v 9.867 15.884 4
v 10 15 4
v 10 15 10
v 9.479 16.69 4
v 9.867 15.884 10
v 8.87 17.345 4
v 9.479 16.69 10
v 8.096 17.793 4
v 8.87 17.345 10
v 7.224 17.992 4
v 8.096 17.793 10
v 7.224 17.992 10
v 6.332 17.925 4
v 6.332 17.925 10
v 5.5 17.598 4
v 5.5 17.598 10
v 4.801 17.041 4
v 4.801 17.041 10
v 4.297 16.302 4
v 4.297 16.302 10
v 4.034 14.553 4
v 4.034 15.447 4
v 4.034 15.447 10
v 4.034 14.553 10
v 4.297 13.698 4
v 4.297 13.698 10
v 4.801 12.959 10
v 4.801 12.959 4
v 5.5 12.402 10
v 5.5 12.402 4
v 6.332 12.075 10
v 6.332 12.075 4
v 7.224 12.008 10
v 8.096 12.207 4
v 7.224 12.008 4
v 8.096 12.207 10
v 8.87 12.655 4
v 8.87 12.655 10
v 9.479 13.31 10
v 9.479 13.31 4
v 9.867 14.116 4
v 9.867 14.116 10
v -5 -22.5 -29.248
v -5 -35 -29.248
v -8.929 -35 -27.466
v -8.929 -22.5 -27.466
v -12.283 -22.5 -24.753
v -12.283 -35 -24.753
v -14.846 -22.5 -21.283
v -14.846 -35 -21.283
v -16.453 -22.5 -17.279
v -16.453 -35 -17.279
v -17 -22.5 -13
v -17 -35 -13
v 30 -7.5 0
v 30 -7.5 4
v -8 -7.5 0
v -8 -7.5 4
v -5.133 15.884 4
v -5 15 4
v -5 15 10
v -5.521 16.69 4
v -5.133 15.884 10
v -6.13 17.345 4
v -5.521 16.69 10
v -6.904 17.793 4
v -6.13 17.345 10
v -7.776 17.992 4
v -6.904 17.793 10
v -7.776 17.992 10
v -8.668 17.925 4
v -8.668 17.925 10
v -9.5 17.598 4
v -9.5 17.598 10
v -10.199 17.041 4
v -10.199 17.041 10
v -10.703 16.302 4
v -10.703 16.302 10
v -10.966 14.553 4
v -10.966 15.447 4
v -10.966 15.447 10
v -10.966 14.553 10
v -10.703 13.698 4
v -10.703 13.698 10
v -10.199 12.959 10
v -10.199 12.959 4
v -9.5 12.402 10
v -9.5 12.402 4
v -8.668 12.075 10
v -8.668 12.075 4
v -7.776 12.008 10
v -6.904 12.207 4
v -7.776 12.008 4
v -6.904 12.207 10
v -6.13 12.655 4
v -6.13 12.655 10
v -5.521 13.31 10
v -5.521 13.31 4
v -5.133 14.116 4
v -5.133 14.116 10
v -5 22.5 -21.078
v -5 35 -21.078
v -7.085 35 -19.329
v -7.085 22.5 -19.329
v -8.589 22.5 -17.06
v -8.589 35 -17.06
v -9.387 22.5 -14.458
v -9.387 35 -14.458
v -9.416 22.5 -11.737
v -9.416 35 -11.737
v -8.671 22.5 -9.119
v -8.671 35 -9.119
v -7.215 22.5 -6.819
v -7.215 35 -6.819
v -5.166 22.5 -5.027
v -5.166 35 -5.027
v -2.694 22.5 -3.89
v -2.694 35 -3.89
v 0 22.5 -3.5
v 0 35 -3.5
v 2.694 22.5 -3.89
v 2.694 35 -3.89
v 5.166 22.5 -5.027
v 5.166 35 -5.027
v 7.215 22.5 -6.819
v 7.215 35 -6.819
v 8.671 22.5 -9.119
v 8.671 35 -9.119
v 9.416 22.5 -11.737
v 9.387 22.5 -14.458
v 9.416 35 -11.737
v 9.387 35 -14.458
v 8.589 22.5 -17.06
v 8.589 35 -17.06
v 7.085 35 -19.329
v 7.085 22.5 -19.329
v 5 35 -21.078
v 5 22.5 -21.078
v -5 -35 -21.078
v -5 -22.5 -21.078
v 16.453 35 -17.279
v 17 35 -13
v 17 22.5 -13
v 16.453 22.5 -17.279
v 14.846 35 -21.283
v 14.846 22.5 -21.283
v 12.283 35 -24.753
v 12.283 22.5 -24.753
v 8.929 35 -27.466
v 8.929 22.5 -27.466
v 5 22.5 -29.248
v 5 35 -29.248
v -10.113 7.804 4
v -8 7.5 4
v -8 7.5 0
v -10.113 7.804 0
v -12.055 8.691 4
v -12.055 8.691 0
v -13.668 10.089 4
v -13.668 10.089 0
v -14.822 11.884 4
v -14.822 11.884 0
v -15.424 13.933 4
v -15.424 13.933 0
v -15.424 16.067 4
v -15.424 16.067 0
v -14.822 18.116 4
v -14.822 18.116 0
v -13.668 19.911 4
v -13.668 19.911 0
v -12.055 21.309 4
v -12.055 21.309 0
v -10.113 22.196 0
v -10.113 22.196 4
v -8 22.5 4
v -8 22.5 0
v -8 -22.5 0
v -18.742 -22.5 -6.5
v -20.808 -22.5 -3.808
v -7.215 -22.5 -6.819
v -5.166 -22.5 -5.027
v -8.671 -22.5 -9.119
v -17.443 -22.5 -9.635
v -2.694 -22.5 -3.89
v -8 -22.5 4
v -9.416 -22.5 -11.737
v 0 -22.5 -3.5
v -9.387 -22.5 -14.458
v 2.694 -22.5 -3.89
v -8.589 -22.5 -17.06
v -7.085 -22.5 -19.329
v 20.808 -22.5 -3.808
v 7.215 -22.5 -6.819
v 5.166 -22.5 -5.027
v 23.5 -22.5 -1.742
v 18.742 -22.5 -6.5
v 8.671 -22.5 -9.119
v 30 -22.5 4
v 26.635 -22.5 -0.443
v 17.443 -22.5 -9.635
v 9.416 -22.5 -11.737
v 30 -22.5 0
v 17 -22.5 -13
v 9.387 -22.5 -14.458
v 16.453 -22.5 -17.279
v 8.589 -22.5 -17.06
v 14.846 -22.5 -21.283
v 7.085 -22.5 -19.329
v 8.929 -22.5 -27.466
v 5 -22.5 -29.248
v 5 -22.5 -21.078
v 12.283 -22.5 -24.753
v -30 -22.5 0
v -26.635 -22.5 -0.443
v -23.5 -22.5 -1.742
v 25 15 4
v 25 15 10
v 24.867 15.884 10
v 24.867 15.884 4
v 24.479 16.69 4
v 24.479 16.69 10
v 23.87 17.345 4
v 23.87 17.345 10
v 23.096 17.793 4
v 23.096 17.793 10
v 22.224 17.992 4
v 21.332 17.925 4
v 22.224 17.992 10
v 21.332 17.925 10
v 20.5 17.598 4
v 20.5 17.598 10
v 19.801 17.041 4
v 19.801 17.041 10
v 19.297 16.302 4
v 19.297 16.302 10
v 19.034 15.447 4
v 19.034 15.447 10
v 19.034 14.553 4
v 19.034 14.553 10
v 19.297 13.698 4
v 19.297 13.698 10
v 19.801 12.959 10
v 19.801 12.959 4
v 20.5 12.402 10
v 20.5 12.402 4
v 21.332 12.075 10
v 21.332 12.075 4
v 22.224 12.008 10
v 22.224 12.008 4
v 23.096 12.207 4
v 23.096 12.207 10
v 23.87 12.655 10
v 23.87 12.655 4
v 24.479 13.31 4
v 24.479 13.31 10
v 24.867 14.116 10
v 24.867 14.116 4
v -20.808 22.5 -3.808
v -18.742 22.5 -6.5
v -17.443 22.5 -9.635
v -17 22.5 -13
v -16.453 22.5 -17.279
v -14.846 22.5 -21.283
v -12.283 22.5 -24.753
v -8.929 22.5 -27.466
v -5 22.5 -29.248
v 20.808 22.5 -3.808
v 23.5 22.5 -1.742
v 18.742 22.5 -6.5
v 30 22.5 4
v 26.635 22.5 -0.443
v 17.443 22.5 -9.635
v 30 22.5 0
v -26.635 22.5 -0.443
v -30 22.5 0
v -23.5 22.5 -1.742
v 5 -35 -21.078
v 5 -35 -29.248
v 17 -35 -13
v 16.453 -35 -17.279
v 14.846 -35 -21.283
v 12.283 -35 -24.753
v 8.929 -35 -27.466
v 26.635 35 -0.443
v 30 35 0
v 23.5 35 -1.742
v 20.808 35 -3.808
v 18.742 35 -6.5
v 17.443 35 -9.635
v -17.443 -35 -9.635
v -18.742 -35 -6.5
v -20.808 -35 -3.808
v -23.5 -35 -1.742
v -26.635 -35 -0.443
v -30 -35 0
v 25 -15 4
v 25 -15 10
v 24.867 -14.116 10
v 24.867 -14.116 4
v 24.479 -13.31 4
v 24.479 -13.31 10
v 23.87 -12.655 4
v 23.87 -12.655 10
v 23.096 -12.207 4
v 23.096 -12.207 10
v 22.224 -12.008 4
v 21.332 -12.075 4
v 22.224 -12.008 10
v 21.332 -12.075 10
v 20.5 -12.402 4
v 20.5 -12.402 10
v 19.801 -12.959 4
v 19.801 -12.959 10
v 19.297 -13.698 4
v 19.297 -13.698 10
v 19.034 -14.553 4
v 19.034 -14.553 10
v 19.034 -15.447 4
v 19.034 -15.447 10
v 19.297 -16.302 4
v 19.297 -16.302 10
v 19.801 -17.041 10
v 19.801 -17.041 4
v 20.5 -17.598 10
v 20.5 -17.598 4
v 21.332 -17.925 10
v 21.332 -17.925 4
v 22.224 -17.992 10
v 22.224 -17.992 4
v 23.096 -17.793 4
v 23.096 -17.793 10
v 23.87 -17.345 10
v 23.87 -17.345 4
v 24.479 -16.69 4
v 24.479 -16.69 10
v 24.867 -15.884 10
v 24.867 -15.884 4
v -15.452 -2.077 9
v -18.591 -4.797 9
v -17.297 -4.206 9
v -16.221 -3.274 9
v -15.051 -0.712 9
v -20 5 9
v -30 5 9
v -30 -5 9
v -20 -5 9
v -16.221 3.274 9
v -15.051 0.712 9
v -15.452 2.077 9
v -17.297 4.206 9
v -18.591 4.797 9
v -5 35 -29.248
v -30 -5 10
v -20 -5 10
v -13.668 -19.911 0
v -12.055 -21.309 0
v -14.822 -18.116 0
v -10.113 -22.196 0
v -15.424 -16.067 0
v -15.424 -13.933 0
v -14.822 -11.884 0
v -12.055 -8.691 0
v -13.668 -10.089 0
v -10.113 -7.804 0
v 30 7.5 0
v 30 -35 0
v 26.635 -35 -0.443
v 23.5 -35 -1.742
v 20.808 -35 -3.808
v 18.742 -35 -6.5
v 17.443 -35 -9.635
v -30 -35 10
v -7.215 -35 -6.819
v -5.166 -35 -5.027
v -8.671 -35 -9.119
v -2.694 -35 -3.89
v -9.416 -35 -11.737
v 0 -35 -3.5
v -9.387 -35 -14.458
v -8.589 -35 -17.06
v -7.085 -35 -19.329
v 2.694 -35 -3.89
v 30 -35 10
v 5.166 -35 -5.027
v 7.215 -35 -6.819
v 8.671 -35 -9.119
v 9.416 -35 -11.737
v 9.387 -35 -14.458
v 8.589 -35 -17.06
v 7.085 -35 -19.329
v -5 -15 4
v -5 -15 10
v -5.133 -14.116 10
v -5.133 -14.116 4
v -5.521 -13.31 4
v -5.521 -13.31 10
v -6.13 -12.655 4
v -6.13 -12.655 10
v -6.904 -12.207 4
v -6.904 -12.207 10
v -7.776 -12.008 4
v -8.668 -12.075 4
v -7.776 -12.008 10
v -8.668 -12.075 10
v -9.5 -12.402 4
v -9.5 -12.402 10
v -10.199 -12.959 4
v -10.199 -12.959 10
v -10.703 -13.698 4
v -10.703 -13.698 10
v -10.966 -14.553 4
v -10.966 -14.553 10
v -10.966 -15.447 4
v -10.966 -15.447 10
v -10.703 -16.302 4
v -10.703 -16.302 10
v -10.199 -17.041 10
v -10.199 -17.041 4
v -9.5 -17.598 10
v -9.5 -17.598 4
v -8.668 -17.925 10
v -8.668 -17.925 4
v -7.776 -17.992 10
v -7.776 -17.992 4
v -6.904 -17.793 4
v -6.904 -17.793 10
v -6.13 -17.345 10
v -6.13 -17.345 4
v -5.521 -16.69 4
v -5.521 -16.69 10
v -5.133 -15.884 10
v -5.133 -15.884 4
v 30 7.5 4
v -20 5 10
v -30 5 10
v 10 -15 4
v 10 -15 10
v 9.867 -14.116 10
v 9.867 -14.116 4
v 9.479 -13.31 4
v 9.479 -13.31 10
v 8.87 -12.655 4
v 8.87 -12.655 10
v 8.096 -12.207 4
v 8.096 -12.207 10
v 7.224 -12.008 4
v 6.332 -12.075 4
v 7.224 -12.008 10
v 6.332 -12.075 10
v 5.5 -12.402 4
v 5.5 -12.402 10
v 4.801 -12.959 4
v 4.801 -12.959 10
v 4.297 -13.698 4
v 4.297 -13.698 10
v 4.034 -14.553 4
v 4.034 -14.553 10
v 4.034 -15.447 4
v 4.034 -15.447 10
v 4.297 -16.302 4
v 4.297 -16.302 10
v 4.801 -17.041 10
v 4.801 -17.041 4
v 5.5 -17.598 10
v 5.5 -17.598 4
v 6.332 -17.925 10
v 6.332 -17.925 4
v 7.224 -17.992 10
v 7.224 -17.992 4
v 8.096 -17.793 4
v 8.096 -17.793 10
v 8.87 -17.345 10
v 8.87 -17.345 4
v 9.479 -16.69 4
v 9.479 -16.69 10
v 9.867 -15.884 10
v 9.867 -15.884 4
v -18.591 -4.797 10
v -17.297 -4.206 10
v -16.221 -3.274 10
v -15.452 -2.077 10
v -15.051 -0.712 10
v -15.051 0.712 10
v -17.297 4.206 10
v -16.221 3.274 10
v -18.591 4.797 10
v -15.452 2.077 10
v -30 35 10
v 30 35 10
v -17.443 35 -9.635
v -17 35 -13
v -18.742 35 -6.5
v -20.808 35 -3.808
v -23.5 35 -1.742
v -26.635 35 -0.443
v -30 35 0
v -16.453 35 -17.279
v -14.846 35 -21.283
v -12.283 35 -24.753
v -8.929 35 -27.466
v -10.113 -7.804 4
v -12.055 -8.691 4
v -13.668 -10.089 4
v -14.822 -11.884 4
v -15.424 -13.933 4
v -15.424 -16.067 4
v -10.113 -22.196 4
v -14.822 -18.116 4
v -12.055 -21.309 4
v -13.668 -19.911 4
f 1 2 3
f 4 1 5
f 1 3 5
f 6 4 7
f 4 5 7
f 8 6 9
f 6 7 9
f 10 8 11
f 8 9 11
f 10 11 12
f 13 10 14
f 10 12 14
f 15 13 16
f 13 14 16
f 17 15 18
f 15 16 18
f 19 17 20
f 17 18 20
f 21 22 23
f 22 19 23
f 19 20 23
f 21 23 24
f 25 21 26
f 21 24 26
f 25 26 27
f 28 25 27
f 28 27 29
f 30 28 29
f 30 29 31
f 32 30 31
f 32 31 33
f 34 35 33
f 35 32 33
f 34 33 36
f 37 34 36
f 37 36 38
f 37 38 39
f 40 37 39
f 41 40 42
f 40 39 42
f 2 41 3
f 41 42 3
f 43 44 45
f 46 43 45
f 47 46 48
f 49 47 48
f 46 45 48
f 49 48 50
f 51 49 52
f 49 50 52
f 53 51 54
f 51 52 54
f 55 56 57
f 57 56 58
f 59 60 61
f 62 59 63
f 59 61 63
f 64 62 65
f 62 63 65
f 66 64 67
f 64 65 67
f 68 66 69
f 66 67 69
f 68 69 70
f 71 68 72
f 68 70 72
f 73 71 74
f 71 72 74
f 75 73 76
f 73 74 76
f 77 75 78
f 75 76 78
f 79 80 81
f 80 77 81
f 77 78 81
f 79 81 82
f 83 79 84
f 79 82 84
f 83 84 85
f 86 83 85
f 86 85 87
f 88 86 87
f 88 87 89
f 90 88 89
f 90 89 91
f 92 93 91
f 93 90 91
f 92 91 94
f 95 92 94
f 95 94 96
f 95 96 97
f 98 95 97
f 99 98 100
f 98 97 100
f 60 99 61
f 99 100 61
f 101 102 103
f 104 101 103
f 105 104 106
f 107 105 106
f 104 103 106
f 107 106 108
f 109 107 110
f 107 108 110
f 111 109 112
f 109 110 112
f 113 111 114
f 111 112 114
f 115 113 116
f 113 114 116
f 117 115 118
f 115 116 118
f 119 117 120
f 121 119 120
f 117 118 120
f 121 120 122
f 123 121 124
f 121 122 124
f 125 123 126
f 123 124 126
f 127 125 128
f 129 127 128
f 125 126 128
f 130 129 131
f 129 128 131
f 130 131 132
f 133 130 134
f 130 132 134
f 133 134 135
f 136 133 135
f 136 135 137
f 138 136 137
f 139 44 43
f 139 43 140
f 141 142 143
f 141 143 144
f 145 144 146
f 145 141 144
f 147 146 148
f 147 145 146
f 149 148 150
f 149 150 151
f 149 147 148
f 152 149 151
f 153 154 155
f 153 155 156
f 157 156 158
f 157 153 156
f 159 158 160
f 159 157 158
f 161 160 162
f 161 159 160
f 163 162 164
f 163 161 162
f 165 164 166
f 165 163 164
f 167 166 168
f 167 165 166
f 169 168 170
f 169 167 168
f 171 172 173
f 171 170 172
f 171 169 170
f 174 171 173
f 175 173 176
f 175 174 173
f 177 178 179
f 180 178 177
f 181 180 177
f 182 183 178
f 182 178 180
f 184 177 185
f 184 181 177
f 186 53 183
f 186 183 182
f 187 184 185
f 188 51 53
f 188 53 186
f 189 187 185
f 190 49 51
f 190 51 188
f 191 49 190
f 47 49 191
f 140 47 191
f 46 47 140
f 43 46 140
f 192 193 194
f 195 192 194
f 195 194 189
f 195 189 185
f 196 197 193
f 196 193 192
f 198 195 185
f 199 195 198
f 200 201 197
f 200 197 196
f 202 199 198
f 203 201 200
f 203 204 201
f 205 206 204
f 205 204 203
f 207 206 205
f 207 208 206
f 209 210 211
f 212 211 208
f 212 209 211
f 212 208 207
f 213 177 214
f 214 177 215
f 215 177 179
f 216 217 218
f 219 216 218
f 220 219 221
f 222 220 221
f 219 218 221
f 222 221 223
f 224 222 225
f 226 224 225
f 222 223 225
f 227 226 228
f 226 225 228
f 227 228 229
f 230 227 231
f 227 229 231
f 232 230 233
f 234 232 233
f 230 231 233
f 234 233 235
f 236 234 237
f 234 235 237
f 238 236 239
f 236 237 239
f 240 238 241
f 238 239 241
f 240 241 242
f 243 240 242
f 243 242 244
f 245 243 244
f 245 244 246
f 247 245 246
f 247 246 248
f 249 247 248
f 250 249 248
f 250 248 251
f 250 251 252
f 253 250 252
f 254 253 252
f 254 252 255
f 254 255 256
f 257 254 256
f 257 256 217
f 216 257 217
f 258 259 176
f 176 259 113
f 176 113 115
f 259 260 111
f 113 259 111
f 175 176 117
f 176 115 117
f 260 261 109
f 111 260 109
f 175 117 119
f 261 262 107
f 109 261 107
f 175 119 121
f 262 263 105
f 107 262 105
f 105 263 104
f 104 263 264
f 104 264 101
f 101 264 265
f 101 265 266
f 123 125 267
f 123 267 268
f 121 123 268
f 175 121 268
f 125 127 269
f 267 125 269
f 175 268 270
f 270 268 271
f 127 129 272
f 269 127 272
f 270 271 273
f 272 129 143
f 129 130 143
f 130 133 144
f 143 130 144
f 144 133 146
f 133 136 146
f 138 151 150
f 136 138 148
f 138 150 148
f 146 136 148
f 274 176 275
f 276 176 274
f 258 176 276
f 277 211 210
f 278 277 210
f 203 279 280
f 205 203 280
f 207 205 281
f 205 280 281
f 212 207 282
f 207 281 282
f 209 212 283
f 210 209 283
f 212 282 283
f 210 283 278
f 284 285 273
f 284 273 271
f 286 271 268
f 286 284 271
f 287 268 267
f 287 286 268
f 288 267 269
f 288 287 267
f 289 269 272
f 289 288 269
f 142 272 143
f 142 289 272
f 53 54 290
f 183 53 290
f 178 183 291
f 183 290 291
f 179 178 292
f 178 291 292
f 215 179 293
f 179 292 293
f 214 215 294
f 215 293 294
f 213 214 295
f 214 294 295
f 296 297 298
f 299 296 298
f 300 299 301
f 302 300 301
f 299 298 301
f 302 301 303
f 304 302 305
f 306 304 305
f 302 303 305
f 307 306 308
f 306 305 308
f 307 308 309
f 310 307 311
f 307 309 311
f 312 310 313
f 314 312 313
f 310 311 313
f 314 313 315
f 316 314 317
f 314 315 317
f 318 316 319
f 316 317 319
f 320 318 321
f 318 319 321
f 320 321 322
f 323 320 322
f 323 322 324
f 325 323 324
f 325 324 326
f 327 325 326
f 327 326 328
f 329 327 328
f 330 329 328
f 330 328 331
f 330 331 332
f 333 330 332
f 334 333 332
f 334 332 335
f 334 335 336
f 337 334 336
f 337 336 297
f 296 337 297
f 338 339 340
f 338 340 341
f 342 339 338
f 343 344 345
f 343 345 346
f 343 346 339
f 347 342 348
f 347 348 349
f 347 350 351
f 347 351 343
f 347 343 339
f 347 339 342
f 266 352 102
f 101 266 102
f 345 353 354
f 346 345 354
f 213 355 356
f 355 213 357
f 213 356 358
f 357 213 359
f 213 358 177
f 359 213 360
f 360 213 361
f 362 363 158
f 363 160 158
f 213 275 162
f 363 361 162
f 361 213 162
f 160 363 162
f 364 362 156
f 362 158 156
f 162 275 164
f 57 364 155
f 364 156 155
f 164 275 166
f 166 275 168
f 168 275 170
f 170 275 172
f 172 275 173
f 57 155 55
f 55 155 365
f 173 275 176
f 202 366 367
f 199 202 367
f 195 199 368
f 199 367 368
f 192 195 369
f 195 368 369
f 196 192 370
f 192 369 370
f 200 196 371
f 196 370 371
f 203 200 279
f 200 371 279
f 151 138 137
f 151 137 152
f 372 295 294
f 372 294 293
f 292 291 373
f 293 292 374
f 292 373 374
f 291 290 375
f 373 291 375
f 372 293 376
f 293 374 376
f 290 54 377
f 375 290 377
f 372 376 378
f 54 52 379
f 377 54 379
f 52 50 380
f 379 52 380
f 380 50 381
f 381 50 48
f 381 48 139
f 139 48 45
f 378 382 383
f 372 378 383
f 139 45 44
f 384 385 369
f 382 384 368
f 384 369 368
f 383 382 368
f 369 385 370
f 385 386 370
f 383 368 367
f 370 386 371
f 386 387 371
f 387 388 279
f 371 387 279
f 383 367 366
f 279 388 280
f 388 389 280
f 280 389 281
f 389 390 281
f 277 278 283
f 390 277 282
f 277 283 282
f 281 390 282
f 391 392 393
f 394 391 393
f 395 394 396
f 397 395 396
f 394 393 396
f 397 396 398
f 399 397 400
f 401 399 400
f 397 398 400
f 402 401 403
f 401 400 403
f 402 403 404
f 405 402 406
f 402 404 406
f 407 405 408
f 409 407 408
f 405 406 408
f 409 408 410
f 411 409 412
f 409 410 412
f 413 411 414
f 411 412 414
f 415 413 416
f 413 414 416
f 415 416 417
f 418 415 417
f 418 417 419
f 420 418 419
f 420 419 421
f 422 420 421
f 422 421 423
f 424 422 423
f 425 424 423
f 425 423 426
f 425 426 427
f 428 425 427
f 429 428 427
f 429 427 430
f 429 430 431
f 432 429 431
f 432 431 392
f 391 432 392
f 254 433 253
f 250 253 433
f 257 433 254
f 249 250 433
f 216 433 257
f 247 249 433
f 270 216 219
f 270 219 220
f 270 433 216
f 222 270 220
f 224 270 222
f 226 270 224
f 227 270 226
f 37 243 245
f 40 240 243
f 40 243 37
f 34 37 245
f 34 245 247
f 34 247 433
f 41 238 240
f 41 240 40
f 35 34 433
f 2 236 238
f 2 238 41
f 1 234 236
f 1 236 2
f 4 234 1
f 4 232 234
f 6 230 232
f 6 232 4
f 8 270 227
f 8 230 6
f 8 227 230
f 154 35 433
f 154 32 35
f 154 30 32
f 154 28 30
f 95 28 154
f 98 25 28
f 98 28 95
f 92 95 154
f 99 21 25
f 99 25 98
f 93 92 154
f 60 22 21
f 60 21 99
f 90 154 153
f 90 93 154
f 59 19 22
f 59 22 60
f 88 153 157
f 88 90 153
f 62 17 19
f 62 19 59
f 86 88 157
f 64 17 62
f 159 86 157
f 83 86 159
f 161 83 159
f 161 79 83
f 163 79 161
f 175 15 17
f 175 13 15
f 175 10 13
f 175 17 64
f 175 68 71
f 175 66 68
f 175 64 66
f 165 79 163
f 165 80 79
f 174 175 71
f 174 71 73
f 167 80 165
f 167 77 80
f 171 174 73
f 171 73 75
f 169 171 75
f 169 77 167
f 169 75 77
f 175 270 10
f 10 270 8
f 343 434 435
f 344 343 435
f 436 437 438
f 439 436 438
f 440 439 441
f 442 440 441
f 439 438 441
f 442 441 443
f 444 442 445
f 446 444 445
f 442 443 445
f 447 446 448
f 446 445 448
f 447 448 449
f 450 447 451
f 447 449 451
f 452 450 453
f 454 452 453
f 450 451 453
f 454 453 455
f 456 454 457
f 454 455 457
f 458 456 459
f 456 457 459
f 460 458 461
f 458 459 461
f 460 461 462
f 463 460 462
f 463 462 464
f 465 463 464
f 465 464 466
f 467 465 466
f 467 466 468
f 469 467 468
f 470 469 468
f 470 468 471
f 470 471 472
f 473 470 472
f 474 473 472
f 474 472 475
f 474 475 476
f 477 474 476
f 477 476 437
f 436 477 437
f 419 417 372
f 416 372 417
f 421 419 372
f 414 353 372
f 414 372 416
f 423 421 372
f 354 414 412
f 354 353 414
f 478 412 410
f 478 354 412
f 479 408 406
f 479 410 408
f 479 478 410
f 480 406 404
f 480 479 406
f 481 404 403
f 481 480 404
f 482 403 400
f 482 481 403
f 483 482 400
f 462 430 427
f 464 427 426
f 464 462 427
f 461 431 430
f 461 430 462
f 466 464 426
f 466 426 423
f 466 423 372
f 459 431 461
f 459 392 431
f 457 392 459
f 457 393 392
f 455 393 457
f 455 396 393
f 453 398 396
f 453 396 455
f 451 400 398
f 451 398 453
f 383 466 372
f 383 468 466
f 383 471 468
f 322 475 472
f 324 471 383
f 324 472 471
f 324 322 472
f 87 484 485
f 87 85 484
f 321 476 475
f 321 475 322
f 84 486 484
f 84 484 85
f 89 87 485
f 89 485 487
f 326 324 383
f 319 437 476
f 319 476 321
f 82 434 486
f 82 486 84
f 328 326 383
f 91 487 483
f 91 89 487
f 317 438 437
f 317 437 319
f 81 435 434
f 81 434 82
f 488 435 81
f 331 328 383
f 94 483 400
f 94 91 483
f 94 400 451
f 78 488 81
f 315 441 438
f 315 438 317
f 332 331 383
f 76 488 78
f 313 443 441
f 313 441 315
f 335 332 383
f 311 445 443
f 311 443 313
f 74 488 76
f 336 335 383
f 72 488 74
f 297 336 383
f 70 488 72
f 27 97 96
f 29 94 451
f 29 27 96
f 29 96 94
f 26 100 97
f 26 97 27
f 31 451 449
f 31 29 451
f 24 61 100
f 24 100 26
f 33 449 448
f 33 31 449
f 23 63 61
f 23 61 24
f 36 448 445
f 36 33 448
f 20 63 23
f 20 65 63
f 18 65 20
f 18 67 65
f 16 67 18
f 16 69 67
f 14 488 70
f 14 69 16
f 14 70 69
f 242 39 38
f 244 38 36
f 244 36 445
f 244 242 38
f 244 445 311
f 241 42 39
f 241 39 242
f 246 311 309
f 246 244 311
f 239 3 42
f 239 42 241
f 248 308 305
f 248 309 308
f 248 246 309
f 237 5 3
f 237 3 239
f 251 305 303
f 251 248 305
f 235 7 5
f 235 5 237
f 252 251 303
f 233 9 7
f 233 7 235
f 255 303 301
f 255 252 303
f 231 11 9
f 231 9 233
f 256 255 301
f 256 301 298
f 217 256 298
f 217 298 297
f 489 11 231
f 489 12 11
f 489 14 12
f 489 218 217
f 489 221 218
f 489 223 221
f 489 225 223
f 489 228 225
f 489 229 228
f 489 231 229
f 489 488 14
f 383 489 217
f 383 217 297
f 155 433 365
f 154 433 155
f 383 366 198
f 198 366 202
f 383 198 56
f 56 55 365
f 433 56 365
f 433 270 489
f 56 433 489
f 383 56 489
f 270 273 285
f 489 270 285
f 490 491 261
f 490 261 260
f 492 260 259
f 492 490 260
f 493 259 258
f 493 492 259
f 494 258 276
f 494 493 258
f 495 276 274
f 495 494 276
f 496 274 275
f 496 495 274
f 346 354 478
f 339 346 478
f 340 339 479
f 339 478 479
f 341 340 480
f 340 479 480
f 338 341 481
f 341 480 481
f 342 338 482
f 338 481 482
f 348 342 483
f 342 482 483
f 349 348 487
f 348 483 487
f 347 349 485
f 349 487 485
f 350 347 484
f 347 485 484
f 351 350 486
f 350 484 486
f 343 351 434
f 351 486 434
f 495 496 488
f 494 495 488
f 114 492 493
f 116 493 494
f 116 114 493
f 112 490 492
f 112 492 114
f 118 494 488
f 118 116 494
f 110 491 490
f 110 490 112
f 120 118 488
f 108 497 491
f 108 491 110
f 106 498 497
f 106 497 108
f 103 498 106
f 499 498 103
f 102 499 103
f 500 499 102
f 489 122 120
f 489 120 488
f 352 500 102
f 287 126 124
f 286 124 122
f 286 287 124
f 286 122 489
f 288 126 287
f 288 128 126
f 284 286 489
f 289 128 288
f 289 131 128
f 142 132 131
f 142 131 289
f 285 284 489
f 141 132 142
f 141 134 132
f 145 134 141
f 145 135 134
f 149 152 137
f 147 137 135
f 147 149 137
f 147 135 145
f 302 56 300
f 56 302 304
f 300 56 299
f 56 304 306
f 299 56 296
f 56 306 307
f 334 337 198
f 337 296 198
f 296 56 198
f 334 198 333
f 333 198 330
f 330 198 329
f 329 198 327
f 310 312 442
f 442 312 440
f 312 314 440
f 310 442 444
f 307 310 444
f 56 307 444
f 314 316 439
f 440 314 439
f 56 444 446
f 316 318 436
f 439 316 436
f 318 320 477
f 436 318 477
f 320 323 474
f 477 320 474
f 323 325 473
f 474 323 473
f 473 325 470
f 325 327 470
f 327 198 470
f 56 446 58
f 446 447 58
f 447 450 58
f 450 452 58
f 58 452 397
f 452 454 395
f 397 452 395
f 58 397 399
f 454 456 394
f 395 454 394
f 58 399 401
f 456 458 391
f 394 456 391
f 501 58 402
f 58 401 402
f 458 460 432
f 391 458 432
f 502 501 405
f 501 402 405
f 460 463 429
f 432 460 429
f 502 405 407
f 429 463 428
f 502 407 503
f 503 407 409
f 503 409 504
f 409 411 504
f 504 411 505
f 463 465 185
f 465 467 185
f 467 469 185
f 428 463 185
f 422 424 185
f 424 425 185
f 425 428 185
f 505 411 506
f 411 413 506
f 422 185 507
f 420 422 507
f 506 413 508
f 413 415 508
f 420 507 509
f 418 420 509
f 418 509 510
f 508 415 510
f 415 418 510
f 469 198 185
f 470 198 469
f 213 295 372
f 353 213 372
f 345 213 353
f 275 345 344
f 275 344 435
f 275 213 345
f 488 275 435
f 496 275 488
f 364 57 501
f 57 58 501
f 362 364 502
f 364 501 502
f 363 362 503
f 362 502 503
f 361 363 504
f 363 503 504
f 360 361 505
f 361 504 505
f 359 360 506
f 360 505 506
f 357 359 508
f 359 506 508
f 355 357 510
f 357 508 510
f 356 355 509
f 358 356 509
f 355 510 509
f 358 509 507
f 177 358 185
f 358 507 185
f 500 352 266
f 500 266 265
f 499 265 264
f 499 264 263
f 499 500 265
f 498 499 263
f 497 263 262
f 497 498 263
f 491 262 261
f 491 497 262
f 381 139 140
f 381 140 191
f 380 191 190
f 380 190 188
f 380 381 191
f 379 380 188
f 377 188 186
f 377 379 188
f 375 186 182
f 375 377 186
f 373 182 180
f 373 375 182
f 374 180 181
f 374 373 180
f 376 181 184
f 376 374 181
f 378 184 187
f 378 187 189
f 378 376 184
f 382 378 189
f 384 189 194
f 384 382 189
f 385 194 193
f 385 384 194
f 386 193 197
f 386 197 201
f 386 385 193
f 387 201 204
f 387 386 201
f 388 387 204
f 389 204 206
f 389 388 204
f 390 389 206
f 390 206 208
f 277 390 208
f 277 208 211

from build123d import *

# Parameters (mm, degrees)
SKETCH_1_W          = 60
SKETCH_1_H          = 70
EXTRUDE_1_DEPTH     = 10
SKETCH_2_R          = 3
CUT_EXTRUDE_1_DEPTH = 48.16990566
CUT_EXTRUDE_START   = -4
SKETCH_3_R          = 7.5
SKETCH_3_R_2        = 3
CUT_EXTRUDE_2_DEPTH = 4
SKETCH_4_R          = 5
CUT_EXTRUDE_3_DEPTH = 1
EXTRUDE_2_DEPTH     = 12.5
SKETCH_7_R          = 9.5
CUT_EXTRUDE_4_DEPTH = 12.5


with BuildPart() as part:
    # 草图1 → 凸台-拉伸1 (new body)
    with BuildSketch(Plane.XY):
        Rectangle(SKETCH_1_W, SKETCH_1_H)
    extrude(amount=EXTRUDE_1_DEPTH)

    # 草图2 → 切除-拉伸1 (cut, through all)
    with BuildSketch(Plane.XY.offset(10)):
        with Locations((-8, 15)):
            Circle(SKETCH_2_R)
        with Locations((7, 15)):
            Circle(SKETCH_2_R)
        with Locations((-8, -15)):
            Circle(SKETCH_2_R)
        with Locations((7, -15)):
            Circle(SKETCH_2_R)
        with Locations((22, 15)):
            Circle(SKETCH_2_R)
        with Locations((22, -15)):
            Circle(SKETCH_2_R)
    extrude(amount=-CUT_EXTRUDE_1_DEPTH, mode=Mode.SUBTRACT)

    # 草图3 → 切除-拉伸2 (cut)
    # profile 1 of 2: a face of its own
    with BuildSketch(Plane(origin=(0, 0, 0), x_dir=(-1, 0, 0), z_dir=(0, 0, -1)).offset(CUT_EXTRUDE_START)):
        with Locations((8, 15)):
            Circle(SKETCH_3_R)
        with Locations(Location((8, 15, 0), (0, 0, 180))):
            Circle(SKETCH_3_R_2, mode=Mode.SUBTRACT)
    # profile 2 of 2: a face of its own
    with BuildSketch(Plane(origin=(0, 0, 0), x_dir=(-1, 0, 0), z_dir=(0, 0, -1)).offset(CUT_EXTRUDE_START)):
        with BuildLine():
            ThreePointArc((8, 7.5), (0.5, 15), (8, 22.5))
            Line((8, 22.5), (-30, 22.5))
            Line((-30, 22.5), (-30, 7.5))
            Line((-30, 7.5), (8, 7.5))
        make_face()
        with Locations(Location((-7, 15, 0), (0, 0, 180))):
            Circle(SKETCH_3_R_2, mode=Mode.SUBTRACT)
    cut_extrude_2 = extrude(amount=CUT_EXTRUDE_2_DEPTH, mode=Mode.SUBTRACT)

    # 镜向1: 切除-拉伸2 across plane
    add(cut_extrude_2.mirror(Plane.ZX), mode=Mode.SUBTRACT)

    # 草图4 → 切除-拉伸3 (cut)
    with BuildSketch(Plane.XY.offset(10)):
        with Locations((-20, 0)):
            Circle(SKETCH_4_R)
        with BuildLine():
            ThreePointArc((-20, -5), (-25, 0), (-20, 5))
            Line((-20, 5), (-30, 5))
            Line((-30, 5), (-30, -5))
            Line((-30, -5), (-20, -5))
        make_face()
    extrude(amount=-CUT_EXTRUDE_3_DEPTH, mode=Mode.SUBTRACT)

    # 草图6 → 凸台-拉伸2 (add)
    with BuildSketch(Plane(origin=(0, 35, 0), x_dir=(1, 0, 0), z_dir=(0, 1, 0))):
        with BuildLine():
            ThreePointArc((30, 0), (20.807611845, 3.807611845), (17, 13))
            ThreePointArc((17, 13), (0, 30), (-17, 13))
            ThreePointArc((-17, 13), (-20.807611845, 3.807611845), (-30, 0))
            Line((-30, 0), (30, 0))
        make_face()
    extrude_2 = extrude(amount=-EXTRUDE_2_DEPTH)

    # 草图7 → 切除-拉伸4 (cut)
    with BuildSketch(Plane(origin=(0, 35, 0), x_dir=(1, 0, 0), z_dir=(0, 1, 0))):
        with Locations((0, 13)):
            Circle(SKETCH_7_R)
        with BuildLine():
            Line((0, 30), (0, 22.5))
            ThreePointArc((0, 22.5), (2.599173089, 22.137521505), (5, 21.077747211))
            Line((5, 21.077747211), (5, 29.248076809))
            ThreePointArc((5, 29.248076809), (2.528111374, 29.810968231), (0, 30))
        make_face()
        with BuildLine():
            ThreePointArc((-5, 21.077747211), (-2.599173089, 22.137521505), (0, 22.5))
            Line((0, 22.5), (0, 30))
            ThreePointArc((0, 30), (-2.528111374, 29.810968231), (-5, 29.248076809))
            Line((-5, 29.248076809), (-5, 21.077747211))
        make_face()
    cut_extrude_4 = extrude(amount=-CUT_EXTRUDE_4_DEPTH, mode=Mode.SUBTRACT)

    # 镜向2: 凸台-拉伸2, 切除-拉伸4 across plane
    add(extrude_2.mirror(Plane.ZX))
    add(cut_extrude_4.mirror(Plane.ZX), mode=Mode.SUBTRACT)


solid = part.part
